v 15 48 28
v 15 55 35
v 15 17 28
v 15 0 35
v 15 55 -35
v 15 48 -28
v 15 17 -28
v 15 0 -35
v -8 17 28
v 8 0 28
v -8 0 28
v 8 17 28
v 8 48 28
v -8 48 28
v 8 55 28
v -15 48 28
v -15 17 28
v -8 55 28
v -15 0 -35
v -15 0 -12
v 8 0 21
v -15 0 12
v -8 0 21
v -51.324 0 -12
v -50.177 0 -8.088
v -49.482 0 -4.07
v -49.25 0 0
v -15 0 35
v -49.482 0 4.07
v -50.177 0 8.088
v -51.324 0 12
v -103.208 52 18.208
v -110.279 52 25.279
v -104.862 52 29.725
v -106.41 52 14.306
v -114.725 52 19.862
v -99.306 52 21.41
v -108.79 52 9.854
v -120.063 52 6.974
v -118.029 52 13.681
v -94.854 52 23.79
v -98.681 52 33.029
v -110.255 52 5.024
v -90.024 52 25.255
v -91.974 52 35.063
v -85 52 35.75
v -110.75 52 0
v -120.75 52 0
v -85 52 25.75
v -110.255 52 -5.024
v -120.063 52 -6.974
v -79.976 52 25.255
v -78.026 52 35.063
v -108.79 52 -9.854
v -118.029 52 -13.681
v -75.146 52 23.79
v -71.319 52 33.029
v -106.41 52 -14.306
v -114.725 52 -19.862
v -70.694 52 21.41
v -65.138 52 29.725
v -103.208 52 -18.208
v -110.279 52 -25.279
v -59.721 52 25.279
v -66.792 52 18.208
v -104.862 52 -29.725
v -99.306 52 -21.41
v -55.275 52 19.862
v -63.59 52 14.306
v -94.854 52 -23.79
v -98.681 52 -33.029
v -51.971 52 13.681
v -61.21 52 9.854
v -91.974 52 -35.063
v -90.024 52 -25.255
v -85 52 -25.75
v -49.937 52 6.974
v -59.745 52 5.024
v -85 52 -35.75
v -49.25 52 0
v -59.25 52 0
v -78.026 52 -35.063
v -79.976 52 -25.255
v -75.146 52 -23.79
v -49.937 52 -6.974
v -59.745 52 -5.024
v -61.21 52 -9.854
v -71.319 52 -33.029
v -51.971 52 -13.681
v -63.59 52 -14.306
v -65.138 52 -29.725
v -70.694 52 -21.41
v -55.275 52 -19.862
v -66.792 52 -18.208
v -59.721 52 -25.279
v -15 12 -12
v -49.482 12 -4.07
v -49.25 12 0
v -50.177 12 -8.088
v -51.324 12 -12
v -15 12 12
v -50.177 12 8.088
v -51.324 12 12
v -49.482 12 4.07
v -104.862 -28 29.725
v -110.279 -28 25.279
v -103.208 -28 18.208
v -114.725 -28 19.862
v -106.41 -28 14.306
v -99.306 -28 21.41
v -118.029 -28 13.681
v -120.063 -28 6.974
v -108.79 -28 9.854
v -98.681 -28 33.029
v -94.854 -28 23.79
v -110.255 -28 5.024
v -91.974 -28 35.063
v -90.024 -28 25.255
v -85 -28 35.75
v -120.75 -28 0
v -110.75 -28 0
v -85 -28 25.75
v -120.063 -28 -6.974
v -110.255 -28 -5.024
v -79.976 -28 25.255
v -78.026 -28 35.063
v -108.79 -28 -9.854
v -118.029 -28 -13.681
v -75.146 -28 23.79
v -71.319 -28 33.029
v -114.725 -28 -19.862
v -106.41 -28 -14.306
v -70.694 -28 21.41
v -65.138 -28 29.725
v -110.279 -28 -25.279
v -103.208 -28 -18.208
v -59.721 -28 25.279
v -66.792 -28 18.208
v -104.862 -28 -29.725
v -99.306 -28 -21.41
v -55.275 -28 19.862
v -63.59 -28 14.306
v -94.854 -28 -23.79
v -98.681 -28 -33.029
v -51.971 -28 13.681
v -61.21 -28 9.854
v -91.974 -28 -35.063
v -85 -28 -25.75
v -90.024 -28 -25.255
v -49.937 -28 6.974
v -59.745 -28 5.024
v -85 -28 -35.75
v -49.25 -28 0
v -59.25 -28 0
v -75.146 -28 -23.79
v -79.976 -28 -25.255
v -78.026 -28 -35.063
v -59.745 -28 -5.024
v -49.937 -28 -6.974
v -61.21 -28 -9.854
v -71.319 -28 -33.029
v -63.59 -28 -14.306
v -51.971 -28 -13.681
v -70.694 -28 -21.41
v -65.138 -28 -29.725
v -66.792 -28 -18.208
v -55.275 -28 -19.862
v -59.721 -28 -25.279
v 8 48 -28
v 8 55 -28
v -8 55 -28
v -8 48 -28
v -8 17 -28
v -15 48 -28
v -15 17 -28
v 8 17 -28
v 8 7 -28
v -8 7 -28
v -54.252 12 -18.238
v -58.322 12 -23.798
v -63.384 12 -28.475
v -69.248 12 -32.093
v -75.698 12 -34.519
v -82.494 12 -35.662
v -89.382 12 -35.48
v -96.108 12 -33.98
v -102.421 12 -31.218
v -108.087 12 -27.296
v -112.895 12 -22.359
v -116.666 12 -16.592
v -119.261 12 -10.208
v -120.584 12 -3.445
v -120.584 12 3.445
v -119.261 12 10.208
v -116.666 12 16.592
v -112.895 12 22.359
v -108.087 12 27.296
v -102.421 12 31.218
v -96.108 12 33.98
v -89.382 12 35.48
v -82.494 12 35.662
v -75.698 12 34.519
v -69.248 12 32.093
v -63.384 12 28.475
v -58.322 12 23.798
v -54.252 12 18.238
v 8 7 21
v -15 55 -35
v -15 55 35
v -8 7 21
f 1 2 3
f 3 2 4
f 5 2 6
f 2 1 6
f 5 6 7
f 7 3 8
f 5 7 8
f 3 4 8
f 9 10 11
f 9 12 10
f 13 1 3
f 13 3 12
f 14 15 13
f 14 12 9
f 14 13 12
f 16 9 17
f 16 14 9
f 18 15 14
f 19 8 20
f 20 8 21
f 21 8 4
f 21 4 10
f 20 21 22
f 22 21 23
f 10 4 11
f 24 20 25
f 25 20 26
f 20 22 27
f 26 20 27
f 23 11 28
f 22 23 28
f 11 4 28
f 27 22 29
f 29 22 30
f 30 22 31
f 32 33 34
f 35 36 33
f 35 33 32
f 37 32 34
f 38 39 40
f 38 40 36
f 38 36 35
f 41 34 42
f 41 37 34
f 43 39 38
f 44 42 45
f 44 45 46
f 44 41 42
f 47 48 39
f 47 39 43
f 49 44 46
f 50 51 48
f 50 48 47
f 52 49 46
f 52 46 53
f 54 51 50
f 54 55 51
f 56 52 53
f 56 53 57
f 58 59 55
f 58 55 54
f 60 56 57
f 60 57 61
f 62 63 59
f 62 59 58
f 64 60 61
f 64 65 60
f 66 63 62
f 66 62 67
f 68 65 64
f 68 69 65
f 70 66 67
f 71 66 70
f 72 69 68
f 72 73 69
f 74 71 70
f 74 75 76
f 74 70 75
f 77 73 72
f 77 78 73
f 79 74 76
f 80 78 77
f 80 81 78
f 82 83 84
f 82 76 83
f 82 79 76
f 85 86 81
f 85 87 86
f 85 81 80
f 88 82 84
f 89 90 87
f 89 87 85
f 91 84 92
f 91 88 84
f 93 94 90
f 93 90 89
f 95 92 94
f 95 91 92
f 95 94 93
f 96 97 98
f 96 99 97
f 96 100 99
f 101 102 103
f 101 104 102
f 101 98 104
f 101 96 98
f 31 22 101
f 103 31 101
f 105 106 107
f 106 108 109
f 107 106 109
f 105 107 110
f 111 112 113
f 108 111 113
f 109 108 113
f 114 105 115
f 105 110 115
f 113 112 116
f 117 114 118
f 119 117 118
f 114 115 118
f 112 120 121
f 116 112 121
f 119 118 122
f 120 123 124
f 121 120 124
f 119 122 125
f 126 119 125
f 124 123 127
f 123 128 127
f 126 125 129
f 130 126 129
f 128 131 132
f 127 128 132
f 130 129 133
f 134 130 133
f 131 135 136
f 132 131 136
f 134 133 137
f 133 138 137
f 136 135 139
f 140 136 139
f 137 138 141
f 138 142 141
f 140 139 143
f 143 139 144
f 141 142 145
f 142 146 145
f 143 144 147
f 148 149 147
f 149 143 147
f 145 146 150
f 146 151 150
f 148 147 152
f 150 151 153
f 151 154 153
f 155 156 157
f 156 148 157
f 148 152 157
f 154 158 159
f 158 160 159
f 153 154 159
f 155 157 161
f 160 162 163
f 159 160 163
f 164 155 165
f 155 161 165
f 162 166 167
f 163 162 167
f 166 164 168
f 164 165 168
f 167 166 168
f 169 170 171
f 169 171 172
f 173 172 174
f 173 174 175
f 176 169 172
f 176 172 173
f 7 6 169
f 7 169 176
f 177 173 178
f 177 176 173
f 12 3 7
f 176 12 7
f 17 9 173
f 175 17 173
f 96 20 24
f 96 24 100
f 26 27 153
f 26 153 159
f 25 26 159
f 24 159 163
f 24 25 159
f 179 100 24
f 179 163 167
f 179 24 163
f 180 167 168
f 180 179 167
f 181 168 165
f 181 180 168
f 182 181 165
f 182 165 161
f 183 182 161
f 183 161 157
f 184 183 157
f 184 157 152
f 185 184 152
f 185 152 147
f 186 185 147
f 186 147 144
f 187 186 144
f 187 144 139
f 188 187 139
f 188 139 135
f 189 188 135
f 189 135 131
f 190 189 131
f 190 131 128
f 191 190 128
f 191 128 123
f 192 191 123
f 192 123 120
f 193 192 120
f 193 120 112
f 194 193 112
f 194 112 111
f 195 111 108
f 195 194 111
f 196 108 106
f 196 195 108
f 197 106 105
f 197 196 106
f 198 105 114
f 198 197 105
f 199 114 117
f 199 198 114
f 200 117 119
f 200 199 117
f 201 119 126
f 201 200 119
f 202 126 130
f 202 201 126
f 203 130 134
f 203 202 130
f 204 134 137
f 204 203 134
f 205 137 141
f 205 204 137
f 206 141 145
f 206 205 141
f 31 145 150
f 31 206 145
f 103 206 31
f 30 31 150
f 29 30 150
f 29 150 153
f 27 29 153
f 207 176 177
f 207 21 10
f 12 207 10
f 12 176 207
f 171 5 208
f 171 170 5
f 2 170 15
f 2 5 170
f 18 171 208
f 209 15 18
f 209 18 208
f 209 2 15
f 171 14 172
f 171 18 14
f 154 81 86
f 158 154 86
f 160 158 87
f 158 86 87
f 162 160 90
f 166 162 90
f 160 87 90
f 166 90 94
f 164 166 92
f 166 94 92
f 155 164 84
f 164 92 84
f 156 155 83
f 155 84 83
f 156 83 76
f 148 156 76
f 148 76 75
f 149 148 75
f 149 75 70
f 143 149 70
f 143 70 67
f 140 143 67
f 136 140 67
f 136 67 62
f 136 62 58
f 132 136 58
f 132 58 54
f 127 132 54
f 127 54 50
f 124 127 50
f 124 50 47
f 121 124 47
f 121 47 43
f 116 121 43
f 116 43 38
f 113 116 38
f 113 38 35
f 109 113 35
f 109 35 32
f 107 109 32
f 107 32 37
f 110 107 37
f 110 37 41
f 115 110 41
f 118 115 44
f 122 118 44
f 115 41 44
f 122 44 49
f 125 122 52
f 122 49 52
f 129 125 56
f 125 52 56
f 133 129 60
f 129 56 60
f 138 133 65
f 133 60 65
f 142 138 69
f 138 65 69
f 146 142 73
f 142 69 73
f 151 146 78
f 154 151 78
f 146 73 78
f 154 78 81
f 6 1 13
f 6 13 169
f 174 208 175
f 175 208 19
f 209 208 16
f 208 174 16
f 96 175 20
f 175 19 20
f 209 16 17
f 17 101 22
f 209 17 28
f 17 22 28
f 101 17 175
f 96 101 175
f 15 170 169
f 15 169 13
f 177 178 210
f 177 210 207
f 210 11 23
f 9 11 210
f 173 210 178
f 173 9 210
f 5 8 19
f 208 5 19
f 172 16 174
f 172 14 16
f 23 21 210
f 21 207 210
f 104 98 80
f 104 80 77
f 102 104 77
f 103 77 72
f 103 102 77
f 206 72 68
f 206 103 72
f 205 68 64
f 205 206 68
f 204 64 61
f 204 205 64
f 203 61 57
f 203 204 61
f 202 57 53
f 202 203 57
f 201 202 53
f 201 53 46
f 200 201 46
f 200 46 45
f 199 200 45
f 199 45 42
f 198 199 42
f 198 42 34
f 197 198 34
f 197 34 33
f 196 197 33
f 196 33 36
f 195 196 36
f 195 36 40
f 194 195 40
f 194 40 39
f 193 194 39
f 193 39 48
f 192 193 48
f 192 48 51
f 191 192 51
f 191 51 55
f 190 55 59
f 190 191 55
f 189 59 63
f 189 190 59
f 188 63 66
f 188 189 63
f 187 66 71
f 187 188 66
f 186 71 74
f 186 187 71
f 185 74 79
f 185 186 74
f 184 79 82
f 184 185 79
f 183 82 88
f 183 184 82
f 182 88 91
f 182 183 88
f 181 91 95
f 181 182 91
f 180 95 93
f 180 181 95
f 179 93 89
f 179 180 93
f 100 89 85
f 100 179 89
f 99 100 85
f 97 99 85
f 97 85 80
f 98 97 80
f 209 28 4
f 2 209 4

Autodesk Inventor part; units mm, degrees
ref_plane "YZ Plane" through (0, 0, 0) normal (1, 0, 0) x (0, 1, 0)
ref_plane "XZ Plane" through (0, 0, 0) normal (0, 1, 0) x (-1, 0, 0)
ref_plane "XY Plane" through (0, 0, 0) normal (0, 0, 1) x (1, 0, 0)
sketch "스케치1" plane through (0, 0, 0) normal (0, 1, 0) x (-1, 0, 0)
  line L0 (-8, 28) -> (8, 28)
  line L1 (8, 28) -> (8, -28)
  line L2 (8, -28) -> (-8, -28)
  line L3 (-8, -28) -> (-8, 28)
  line L4 (-8, 28) -> (8, -28) construction
  line L5 (8, 28) -> (-8, -28) construction
  line L6 (15, -35) -> (15, 35)
  line L7 (15, 35) -> (-15, 35)
  line L8 (-15, 35) -> (-15, -35)
  line L9 (-15, -35) -> (15, -35)
  point P0 (0, 0)
  dimension "d0" = 16
  dimension "d1" = 56
  dimension "d2" = 7
extrude "돌출1" add sketch "스케치1" along normal blind 55 contours L0 L1 L2 L3 | L9 L8 L7 L6
sketch "스케치2" plane through (0, 55, 0) normal (0, 1, 0) x (1, 0, 0)
  line L0 (-15, 35) -> (-15, -35) projected
  line L1 (-15, -35) -> (15, -35) projected
  line L2 (-15, -35) -> (15, -35) projected
  line L3 (15, -35) -> (15, 35) projected
  line L4 (15, 35) -> (-15, 35) projected
  line L5 (-15, 35) -> (-15, -35) projected
  line L6 (8, 28) -> (8, -28)
  line L7 (8, -28) -> (-8, -28)
  line L8 (-8, -28) -> (-8, 28)
  line L9 (-8, 28) -> (8, 28)
  point P0 (0, 0)
  dimension "d5" = 7
extrude "돌출2" cut sketch "스케치2" against normal blind 48 contours L6 L7 L8 L9
sketch "스케치3" plane through (15, 0, 35) normal (1, 0, 0) x (0, 0, -1)
  line L0 (0, 0) -> (70, 0) projected
  line L1 (70, 0) -> (70, 55) projected
  line L2 (0, 55) -> (70, 55) projected
  line L3 (0, 0) -> (0, 55) projected
  line L4 (63, 48) -> (63, 17)
  line L5 (7, 17) -> (7, 48)
  line L6 (7, 48) -> (63, 48)
  line L7 (7, 17) -> (63, 17)
  point P0 (35, 0)
  point P1 (0, 27.5)
  dimension "d8" = 7
  dimension "d10" = 17
  dimension "d11" = 7
  dimension "d12" = 7
  dimension "d13" = 31
extrude "돌출3" cut sketch "스케치3" against normal blind 40 contours L4 L7 L5 L6
sketch "스케치4" plane through (0, 7, 0) normal (0, 1, 0) x (1, 0, 0)
  line L0 (8, -28) -> (-8, -28) projected
  line L1 (-8, -28) -> (-8, 28) projected
  line L2 (8, 28) -> (8, -28) projected
  line L3 (8, -28) -> (-8, -28) projected
  line L4 (8, -21) -> (-8, -21)
  point P0 (0, 0)
  dimension "d16" = 7
extrude "돌출4" cut sketch "스케치4" against normal blind 10
sketch "스케치6" plane through (-15, 0, -35) normal (-1, 0, 0) x (0, 0, 1)
  line L0 (0, 0) -> (70, 0) projected
  line L1 (35, 0) -> (35, 55)
  line L2 (7, 55) -> (63, 55) projected
  line L3 (23, 12) -> (47, 12)
  line L4 (47, 0) -> (47, 12)
  line L5 (23, 0) -> (23, 12)
  dimension "d20" = 12
  dimension "d21" = 12
  dimension "d22" = 12
extrude "돌출5" add sketch "스케치6" along normal blind 70
sketch "스케치7" plane through (-15, 12, 12) normal (0, 1, 0) x (1, 0, 0)
  line L0 (-70, 24) -> (-70, 0) projected
  circle A0 centre (-70, 12) radius 35.75
  point P0 (15, 12)
  dimension "d25" = 71.5
extrude "돌출6" add sketch "스케치7" along normal mid plane 80
sketch "스케치8" plane through (-85, 52, 0) normal (0, 1, 0) x (1, 0, 0)
  circle A0 centre (0, 0) radius 35.75 projected
  circle A1 centre (0, 0) radius 25.75
  point P0 (85, 0)
  dimension "d28" = 10
extrude "돌출7" cut sketch "스케치8" against normal blind 80 contours A1
equation "\"TransitionRadius\" = BendRadius"
equation "\"BendRadius\" = 0.5"
properties part number "카메라 거치대"
